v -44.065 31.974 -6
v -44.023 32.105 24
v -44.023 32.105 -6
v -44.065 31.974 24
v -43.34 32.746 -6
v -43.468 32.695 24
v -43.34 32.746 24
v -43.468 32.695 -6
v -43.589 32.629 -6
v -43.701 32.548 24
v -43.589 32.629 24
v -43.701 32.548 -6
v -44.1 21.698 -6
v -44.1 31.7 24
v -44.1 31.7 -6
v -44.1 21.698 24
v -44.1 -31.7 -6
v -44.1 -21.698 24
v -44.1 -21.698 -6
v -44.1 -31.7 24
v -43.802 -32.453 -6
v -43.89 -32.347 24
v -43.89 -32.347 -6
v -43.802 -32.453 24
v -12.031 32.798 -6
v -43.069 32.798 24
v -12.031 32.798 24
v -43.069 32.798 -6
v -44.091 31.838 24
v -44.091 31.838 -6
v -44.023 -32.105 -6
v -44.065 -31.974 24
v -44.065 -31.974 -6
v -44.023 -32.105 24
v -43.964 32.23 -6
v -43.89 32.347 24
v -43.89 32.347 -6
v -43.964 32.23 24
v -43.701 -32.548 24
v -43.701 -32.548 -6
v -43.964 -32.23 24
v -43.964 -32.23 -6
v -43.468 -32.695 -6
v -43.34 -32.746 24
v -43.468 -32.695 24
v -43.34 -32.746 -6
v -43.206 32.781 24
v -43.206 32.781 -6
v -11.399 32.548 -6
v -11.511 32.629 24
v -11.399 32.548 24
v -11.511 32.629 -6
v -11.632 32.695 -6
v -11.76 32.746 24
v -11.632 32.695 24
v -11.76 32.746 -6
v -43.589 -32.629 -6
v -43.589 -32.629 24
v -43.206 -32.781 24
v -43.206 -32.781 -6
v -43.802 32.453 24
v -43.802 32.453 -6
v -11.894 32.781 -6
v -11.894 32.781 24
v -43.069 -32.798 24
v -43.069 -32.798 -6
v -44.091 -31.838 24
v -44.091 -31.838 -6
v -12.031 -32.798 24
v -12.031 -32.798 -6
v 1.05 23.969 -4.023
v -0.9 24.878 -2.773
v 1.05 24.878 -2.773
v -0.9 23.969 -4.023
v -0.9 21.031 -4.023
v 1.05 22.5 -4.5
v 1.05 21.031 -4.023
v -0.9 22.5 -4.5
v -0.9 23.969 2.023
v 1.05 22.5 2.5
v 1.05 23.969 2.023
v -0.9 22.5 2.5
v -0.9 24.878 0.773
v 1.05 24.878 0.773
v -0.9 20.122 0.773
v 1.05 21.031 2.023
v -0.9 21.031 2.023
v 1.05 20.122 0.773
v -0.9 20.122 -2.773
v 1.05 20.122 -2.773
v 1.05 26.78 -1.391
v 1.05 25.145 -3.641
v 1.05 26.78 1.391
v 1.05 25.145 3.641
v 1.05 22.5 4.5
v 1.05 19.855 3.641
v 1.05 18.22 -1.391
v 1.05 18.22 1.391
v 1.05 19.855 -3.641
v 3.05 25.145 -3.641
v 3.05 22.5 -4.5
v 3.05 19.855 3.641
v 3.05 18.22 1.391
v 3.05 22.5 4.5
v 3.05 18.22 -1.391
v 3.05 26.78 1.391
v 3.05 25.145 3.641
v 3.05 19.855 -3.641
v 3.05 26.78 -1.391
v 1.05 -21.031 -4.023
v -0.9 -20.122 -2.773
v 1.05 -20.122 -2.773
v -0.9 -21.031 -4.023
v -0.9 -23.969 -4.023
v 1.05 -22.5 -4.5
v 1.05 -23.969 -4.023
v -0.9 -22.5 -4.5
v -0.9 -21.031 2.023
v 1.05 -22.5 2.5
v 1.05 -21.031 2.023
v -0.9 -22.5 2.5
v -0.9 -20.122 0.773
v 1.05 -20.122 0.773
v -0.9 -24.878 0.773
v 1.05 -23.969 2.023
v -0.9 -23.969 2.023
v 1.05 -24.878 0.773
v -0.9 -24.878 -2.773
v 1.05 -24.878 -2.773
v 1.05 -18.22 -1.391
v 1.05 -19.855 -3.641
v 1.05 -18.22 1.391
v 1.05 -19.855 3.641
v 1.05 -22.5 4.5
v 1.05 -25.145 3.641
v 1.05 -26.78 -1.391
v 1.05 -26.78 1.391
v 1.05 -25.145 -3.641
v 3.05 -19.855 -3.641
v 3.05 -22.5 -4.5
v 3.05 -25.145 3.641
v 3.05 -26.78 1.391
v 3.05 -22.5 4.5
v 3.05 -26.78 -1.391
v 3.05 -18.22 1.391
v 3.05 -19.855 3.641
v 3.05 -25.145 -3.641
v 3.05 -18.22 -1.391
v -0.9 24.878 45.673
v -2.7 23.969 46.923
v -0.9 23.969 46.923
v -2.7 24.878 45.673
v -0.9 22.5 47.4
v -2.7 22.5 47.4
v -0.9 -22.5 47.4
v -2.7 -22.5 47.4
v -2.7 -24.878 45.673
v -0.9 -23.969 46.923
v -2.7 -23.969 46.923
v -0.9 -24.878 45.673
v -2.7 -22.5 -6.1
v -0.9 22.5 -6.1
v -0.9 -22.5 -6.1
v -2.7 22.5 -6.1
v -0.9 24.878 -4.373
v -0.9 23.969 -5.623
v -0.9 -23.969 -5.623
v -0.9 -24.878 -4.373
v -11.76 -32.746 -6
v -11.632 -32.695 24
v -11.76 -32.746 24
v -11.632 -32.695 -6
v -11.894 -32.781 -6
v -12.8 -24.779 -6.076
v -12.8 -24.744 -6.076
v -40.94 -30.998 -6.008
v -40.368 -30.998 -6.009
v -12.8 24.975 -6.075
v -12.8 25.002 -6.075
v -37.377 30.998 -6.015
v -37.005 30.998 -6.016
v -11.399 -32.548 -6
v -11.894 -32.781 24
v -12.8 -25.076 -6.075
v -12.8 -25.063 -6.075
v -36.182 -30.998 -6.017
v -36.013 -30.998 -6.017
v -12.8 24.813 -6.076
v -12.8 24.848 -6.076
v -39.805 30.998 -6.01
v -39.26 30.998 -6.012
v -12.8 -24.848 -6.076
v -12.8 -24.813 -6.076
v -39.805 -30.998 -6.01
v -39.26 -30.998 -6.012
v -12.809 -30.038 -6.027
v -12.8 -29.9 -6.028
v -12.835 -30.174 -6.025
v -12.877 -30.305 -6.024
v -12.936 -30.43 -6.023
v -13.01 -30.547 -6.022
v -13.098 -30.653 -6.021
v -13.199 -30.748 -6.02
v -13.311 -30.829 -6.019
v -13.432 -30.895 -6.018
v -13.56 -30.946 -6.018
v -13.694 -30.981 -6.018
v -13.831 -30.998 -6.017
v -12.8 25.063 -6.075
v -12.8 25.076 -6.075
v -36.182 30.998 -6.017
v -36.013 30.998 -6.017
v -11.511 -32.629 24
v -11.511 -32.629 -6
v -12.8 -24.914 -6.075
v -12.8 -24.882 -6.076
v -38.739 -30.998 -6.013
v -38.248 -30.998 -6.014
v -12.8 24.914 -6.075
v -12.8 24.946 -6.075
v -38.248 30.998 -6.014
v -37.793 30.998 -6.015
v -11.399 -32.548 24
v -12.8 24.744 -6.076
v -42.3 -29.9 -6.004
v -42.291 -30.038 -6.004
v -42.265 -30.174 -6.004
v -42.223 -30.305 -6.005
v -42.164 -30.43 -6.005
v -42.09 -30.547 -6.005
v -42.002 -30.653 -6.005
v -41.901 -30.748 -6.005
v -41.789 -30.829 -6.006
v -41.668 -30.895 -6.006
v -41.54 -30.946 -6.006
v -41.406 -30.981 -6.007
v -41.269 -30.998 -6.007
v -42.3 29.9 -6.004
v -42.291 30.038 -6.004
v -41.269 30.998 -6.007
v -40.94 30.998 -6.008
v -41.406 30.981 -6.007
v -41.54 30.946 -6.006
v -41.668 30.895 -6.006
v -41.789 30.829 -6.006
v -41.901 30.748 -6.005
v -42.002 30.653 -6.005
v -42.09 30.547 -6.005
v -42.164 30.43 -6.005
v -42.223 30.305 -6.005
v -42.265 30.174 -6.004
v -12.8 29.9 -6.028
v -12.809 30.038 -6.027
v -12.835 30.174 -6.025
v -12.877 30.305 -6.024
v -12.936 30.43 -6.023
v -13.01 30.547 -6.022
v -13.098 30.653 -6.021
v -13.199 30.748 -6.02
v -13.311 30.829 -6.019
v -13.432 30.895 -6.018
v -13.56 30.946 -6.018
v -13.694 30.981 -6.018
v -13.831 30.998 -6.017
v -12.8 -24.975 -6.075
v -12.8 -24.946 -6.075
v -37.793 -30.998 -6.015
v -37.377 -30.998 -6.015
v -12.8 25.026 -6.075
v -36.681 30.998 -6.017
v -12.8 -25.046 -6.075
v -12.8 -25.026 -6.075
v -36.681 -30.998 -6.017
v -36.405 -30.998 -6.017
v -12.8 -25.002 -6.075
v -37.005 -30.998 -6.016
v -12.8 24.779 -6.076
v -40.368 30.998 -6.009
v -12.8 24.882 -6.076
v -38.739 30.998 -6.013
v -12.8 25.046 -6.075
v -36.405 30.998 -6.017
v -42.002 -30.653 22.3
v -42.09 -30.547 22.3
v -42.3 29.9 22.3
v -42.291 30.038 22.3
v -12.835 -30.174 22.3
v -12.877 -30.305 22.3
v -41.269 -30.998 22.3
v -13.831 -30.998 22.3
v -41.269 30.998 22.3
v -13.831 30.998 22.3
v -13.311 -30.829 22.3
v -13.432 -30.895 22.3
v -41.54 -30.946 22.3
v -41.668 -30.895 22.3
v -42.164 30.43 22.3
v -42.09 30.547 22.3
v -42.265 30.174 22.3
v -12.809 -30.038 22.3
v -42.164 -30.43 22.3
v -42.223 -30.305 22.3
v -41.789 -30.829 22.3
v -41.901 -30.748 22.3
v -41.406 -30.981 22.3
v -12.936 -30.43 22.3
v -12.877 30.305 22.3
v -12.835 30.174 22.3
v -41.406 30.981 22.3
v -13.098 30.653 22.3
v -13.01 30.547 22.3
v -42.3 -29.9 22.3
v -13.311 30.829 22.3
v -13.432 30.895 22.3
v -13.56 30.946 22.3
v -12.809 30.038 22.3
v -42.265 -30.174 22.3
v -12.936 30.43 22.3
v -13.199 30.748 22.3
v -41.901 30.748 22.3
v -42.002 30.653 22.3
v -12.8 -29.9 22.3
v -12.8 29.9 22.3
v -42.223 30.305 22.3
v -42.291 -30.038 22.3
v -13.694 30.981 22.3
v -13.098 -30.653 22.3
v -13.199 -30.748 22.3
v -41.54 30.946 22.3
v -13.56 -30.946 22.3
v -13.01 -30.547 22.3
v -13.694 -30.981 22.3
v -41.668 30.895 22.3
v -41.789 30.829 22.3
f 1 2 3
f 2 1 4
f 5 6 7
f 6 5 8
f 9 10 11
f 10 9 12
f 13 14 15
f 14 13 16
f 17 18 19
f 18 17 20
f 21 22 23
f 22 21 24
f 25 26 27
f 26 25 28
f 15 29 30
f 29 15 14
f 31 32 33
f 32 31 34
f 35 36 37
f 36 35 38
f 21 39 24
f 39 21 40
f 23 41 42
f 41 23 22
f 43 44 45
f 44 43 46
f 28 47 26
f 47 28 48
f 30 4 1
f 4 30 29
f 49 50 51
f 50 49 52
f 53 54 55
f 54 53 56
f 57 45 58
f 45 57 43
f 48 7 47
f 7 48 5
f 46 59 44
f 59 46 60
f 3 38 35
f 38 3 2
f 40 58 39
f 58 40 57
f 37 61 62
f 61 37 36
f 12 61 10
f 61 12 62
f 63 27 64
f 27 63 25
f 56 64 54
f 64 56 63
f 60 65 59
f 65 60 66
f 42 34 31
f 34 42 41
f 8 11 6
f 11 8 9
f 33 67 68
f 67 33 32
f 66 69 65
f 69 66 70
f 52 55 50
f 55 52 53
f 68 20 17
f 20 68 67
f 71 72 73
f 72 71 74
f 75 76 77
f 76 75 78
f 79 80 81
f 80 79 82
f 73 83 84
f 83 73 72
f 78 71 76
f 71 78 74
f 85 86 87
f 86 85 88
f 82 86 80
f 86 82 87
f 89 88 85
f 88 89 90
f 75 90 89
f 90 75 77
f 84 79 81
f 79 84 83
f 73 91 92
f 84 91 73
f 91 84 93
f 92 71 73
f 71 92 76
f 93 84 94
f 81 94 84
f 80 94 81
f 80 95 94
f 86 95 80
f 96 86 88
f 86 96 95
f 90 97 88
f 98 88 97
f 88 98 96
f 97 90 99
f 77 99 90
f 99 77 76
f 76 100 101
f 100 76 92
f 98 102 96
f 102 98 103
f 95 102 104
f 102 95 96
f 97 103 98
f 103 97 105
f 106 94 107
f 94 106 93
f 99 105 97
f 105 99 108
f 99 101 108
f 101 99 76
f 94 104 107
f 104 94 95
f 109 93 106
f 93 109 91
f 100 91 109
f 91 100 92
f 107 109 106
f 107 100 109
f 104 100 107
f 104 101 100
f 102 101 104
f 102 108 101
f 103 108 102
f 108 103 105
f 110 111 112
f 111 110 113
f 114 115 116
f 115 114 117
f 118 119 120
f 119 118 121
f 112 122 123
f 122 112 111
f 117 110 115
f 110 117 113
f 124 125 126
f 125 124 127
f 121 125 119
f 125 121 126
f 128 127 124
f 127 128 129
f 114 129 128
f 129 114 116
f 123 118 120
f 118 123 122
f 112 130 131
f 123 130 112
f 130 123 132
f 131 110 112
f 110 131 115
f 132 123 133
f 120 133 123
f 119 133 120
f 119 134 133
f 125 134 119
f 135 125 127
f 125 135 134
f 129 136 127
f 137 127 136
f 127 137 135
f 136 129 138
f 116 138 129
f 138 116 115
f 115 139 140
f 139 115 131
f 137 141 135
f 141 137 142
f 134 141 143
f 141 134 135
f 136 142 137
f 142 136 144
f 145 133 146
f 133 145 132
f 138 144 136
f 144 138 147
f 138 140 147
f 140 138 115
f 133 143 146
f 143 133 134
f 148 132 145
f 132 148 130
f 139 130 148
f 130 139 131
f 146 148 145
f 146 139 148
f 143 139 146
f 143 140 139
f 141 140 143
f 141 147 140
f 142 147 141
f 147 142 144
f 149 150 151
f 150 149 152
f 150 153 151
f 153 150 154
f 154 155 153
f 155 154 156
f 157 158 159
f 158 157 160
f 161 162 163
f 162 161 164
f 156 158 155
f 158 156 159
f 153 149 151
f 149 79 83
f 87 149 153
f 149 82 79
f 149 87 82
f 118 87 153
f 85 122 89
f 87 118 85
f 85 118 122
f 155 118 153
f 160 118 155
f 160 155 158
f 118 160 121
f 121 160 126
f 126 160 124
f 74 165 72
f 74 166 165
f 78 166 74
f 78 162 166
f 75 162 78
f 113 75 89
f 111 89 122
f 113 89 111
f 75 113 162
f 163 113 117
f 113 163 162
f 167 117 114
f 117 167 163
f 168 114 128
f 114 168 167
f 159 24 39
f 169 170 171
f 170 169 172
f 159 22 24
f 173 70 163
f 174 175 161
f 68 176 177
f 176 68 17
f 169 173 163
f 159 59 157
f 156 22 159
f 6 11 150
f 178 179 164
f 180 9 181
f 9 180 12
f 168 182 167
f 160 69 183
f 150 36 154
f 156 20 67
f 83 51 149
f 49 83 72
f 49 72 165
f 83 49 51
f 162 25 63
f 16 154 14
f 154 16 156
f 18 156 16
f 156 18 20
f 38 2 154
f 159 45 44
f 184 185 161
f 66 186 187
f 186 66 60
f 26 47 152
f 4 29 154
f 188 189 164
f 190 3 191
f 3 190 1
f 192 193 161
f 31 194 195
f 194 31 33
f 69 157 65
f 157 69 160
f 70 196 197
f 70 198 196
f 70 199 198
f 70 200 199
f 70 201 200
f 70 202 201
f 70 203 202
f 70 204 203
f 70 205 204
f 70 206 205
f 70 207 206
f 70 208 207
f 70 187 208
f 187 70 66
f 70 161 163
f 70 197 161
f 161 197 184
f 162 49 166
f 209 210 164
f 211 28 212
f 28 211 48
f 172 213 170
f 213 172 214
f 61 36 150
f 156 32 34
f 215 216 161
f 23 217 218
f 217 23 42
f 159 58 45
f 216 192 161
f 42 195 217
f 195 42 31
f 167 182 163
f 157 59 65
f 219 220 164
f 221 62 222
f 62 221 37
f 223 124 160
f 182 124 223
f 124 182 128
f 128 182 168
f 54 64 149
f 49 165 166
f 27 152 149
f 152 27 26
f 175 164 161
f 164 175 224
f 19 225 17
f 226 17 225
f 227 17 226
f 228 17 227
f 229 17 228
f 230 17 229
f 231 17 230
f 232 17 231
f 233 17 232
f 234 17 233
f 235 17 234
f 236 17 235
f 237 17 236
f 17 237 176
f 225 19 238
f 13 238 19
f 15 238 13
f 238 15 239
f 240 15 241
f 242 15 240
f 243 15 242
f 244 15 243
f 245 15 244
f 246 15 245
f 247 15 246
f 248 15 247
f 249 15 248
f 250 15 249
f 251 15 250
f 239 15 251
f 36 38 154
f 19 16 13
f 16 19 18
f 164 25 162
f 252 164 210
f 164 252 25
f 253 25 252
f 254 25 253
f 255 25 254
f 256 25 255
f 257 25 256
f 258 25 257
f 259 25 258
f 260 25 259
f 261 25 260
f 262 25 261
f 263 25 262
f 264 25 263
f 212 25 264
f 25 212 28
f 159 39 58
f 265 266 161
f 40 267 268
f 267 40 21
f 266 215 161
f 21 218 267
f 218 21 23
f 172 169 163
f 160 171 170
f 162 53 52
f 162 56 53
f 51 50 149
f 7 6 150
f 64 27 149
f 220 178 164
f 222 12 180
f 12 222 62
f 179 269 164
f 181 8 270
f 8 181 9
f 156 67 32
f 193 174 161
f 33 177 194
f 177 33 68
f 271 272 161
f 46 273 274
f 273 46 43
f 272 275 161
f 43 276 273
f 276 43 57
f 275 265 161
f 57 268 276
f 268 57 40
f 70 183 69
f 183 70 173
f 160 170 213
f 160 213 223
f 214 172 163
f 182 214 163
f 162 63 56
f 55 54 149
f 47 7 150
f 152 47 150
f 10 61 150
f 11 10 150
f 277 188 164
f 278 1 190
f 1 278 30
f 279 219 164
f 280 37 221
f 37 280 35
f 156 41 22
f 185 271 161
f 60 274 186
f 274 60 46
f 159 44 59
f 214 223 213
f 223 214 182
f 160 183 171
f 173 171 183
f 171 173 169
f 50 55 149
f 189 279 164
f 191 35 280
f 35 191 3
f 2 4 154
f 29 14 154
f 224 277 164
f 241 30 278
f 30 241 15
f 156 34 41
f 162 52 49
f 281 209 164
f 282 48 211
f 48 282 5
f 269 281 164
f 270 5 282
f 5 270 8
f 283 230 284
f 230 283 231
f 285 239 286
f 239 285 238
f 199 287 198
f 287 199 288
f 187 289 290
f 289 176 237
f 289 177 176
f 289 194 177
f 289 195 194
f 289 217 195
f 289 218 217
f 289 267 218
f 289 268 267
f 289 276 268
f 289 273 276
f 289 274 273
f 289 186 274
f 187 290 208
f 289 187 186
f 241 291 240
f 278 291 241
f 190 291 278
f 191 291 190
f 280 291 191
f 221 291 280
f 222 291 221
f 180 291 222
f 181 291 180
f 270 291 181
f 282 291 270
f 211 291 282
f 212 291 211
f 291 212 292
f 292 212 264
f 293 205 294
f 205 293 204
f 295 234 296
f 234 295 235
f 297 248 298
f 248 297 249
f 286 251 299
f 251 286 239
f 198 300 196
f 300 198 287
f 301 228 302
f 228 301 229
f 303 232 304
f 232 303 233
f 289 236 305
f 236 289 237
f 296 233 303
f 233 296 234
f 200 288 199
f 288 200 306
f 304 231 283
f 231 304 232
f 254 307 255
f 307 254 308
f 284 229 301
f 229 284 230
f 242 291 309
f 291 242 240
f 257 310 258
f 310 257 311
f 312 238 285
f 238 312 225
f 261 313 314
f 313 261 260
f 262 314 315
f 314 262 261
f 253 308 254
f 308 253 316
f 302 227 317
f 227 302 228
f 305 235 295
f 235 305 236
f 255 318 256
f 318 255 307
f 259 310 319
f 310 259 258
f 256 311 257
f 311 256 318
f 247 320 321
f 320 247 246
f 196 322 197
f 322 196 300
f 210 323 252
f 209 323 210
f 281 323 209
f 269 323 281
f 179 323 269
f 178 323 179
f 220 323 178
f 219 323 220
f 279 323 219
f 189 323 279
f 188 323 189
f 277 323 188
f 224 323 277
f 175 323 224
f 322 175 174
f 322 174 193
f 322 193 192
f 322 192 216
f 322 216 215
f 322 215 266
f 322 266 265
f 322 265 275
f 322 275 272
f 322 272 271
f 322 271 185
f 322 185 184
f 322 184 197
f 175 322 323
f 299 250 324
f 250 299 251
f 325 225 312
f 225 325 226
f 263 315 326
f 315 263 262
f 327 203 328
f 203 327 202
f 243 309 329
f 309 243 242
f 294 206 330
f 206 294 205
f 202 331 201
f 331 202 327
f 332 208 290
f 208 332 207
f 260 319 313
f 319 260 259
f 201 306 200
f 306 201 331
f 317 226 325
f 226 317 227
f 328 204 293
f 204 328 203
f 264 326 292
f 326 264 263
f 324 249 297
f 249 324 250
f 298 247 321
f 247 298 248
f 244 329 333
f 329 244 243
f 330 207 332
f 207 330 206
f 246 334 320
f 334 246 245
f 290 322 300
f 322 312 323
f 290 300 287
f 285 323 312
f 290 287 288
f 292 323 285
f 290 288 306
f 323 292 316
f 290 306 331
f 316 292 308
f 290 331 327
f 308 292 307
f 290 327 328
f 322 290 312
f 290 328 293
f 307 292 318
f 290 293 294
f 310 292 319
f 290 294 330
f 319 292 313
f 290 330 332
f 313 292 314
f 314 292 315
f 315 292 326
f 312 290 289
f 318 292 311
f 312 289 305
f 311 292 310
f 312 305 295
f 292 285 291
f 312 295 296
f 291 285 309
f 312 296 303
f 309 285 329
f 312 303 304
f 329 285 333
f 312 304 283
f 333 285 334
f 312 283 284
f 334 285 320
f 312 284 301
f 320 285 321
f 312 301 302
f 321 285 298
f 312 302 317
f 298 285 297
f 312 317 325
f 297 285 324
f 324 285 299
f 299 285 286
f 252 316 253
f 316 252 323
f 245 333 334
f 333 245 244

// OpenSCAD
// PEGSTR - Pegboard Wizard
// Design by Marius Gheorghescu, November 2014
// Update log:
// November 9th 2014
//		- first coomplete version. Angled holders are often odd/incorrect.
// November 15th 2014
//		- minor tweaks to increase rendering speed. added logo. 
// November 28th 2014
//		- bug fixes

// preview[view:north, tilt:bottom diagonal]

// width of the orifice
holder_x_size = 62;

// depth of the orifice
holder_y_size = 29.5;

// hight of the holder
holder_height = 30;

// how thick are the walls. Hint: 6*extrusion width produces the best results.
wall_thickness = 1.80;

// how many times to repeat the holder on X axis
holder_x_count = 1;

// how many times to repeat the holder on Y axis
holder_y_count = 1;

// orifice corner radius (roundness). Needs to be less than min(x,y)/2.
corner_radius = 1;

// Use values less than 1.0 to make the bottom of the holder narrow
taper_ratio = 1.0;

// Keyhole connector
keyhole_pin = true;


/* [Advanced] */

// offset from the peg board, typically 0 unless you have an object that needs clearance
holder_offset = 10.0;

// what ratio of the holders bottom is reinforced to the plate [0.0-1.0]
strength_factor = 0.5;

// for bins: what ratio of wall thickness to use for closing the bottom
closed_bottom = 1;

// what percentage cu cut in the front (example to slip in a cable or make the tool snap from the side)
holder_cutout_side = 0.7;

// set an angle for the holder to prevent object from sliding or to view it better from the top
holder_angle = 0;


/* [Hidden] */

// what is the $fn parameter
holder_sides = max(50, min(20, holder_x_size*2));

// dimensions the same outside US?
hole_spacing = 45;
hole_size = 5;
board_thickness = 2;


holder_total_x = wall_thickness + holder_x_count*(wall_thickness+holder_x_size);
holder_total_y = wall_thickness + holder_y_count*(wall_thickness+holder_y_size);
holder_total_z = round(holder_height/hole_spacing)*hole_spacing;
holder_roundness = min(corner_radius, holder_x_size/2, holder_y_size/2); 


// what is the $fn parameter for holders
fn = 10;

epsilon = 0.1;

clip_height = 2*hole_size + 2;
$fn = fn;

module round_rect_ex(x1, y1, x2, y2, z, r1, r2)
{
	$fn=holder_sides;
	brim = z/10;

	//rotate([0,0,(holder_sides==6)?30:((holder_sides==4)?45:0)])
	hull() {
        translate([-x1/2 + r1, y1/2 - r1, z/2-brim/2])
            cylinder(r=r1, h=brim,center=true);
        translate([x1/2 - r1, y1/2 - r1, z/2-brim/2])
            cylinder(r=r1, h=brim,center=true);
        translate([-x1/2 + r1, -y1/2 + r1, z/2-brim/2])
            cylinder(r=r1, h=brim,center=true);
        translate([x1/2 - r1, -y1/2 + r1, z/2-brim/2])
            cylinder(r=r1, h=brim,center=true);

        translate([-x2/2 + r2, y2/2 - r2, -z/2+brim/2])
            cylinder(r=r2, h=brim,center=true);
        translate([x2/2 - r2, y2/2 - r2, -z/2+brim/2])
            cylinder(r=r2, h=brim,center=true);
        translate([-x2/2 + r2, -y2/2 + r2, -z/2+brim/2])
            cylinder(r=r2, h=brim,center=true);
        translate([x2/2 - r2, -y2/2 + r2, -z/2+brim/2])
            cylinder(r=r2, h=brim,center=true);

    }
}

module pin(clip)
{
    if (!keyhole_pin){
        rotate([0,0,15])
        cylinder(r=hole_size/2, h=board_thickness*1.5+epsilon, center=true);
    }

	if (clip) {
	    if (keyhole_pin){
                        color([0,1,0,0.5]){

            hull(){
                cylinder(r=hole_size/2, h=board_thickness+epsilon, center=true);
                translate([-2,0,0])
                cylinder(r=hole_size/2, h=board_thickness+epsilon, center=true);
            }}
			translate([0, 0, (board_thickness+epsilon)/2]){
            cylinder(r=hole_size/2+2, 2, center=false);}
                        
        } else {
            
		rotate([0,0,90])
		intersection() {
			translate([0, 0, hole_size-epsilon])
				cube([hole_size+2*epsilon, clip_height, 2*hole_size], center=true);

			// [-hole_size/2 - 1.95,0, board_thickness/2]
			translate([0, hole_size/2 + 2, board_thickness/2]) 
				rotate([0, 90, 0])
				rotate_extrude(convexity = 5, $fn=200)
				translate([5, 0, 0])
				 circle(r = (hole_size*0.95)/2); 
			
			translate([0, hole_size/2 + 2 - 1.6, board_thickness/2]) 
				rotate([45,0,0])
				translate([0, -0, hole_size*0.6])
					cube([hole_size+2*epsilon, 3*hole_size, hole_size], center=true);
		}
    }
	}
}

module pinboard_clips() 
{
	rotate([0,90,0])
	for(i=[0:round(holder_total_x/hole_spacing)]) {
		for(j=[0:max(strength_factor, round(holder_height/hole_spacing))]) {

			translate([
				j*hole_spacing, 
				-hole_spacing*(round(holder_total_x/hole_spacing)/2) + i*hole_spacing, 
				0])
					pin(j==0);
		}
	}
}

module pinboard(clips)
{
	rotate([0,90,0])
	translate([-epsilon, 0, -wall_thickness - board_thickness/2 + epsilon])
	hull() {
		translate([-clip_height/2 + hole_size/2, 
			-hole_spacing*(round(holder_total_x/hole_spacing)/2),0])
			cylinder(r=hole_size/2, h=wall_thickness);

		translate([-clip_height/2 + hole_size/2, 
			hole_spacing*(round(holder_total_x/hole_spacing)/2),0])
			cylinder(r=hole_size/2,  h=wall_thickness);

		translate([max(strength_factor, round(holder_height/hole_spacing))*hole_spacing,
			-hole_spacing*(round(holder_total_x/hole_spacing)/2),0])
			cylinder(r=hole_size/2, h=wall_thickness);

		translate([max(strength_factor, round(holder_height/hole_spacing))*hole_spacing,
			hole_spacing*(round(holder_total_x/hole_spacing)/2),0])
			cylinder(r=hole_size/2,  h=wall_thickness);

	}
}

module holder(negative)
{
 	for(x=[1:holder_x_count]){
		for(y=[1:holder_y_count]) 
/*		render(convexity=2)*/ {
			translate([
				-holder_total_y /*- (holder_y_size+wall_thickness)/2*/ + y*(holder_y_size+wall_thickness) + wall_thickness,

				-holder_total_x/2 + (holder_x_size+wall_thickness)/2 + (x-1)*(holder_x_size+wall_thickness) + wall_thickness/2,
				 0])			
	{
		rotate([0, holder_angle, 0])
		translate([
			-wall_thickness*abs(sin(holder_angle))-0*abs((holder_y_size/2)*sin(holder_angle))-holder_offset-(holder_y_size + 2*wall_thickness)/2 - board_thickness/2,
			0,
			-(holder_height/2)*sin(holder_angle) - holder_height/2 + clip_height/2
		])
		difference() {
			if (!negative)
				round_rect_ex(
					(holder_y_size + 2*wall_thickness), 
					holder_x_size + 2*wall_thickness, 
					(holder_y_size + 2*wall_thickness)*taper_ratio, 
					(holder_x_size + 2*wall_thickness)*taper_ratio, 
					holder_height, 
					holder_roundness + epsilon, 
					holder_roundness*taper_ratio + epsilon);

				translate([0,0,closed_bottom*wall_thickness])

				if (negative>1) {
					round_rect_ex(
						holder_y_size*taper_ratio, 
						holder_x_size*taper_ratio, 
						holder_y_size*taper_ratio, 
						holder_x_size*taper_ratio, 
						3*max(holder_height, hole_spacing),
						holder_roundness*taper_ratio + epsilon, 
						holder_roundness*taper_ratio + epsilon);
				} else {
					round_rect_ex(
						holder_y_size, 
						holder_x_size, 
						holder_y_size*taper_ratio, 
						holder_x_size*taper_ratio, 
						holder_height+2*epsilon,
						holder_roundness + epsilon, 
						holder_roundness*taper_ratio + epsilon);
				}

			if (!negative)
				if (holder_cutout_side > 0) {

				if (negative>1) {
					hull() {
						scale([1.0, holder_cutout_side, 1.0])
		 					round_rect_ex(
							holder_y_size*taper_ratio, 
							holder_x_size*taper_ratio, 
							holder_y_size*taper_ratio, 
							holder_x_size*taper_ratio, 
							3*max(holder_height, hole_spacing),
							holder_roundness*taper_ratio + epsilon, 
							holder_roundness*taper_ratio + epsilon);
		
						translate([0-(holder_y_size + 2*wall_thickness), 0,0])
						scale([1.0, holder_cutout_side, 1.0])
		 					round_rect_ex(
							holder_y_size*taper_ratio, 
							holder_x_size*taper_ratio, 
							holder_y_size*taper_ratio, 
							holder_x_size*taper_ratio, 
							3*max(holder_height, hole_spacing),
							holder_roundness*taper_ratio + epsilon, 
							holder_roundness*taper_ratio + epsilon);
					}
				} else {
					hull() {
						scale([1.0, holder_cutout_side, 1.0])
		 					round_rect_ex(
							holder_y_size, 
							holder_x_size, 
							holder_y_size*taper_ratio, 
							holder_x_size*taper_ratio, 
							holder_height+2*epsilon,
							holder_roundness + epsilon, 
							holder_roundness*taper_ratio + epsilon);
		
						translate([0-(holder_y_size + 2*wall_thickness), 0,0])
						scale([1.0, holder_cutout_side, 1.0])
		 					round_rect_ex(
							holder_y_size, 
							holder_x_size, 
							holder_y_size*taper_ratio, 
							holder_x_size*taper_ratio, 
							holder_height+2*epsilon,
							holder_roundness + epsilon, 
							holder_roundness*taper_ratio + epsilon);
						}
					}

				}
			}
		} // positioning
	} // for y
	} // for X
}


module pegstr() 
{




	difference() {
		union() {

			pinboard();

			difference() {
				hull() {
                    color ([0,0,0])

  					pinboard();

                    if (closed_bottom > 0)
                        holder(0);
                    else
					intersection() {

						translate([-holder_offset - (strength_factor-0.5)*holder_total_y - wall_thickness/4,0,0])
						cube([
							holder_total_y + 2*wall_thickness, 
							holder_total_x + wall_thickness, 
							2*holder_height
						], center=true);
	
						holder(0);
	
					}	
				}

				if (closed_bottom*wall_thickness < epsilon) {
						holder(2);
				}

			}

			difference() {
				holder(0);
				holder(2);
			}

            pinboard_clips();
		}
        
		holder(1);



	}
}

rotate([180,0,0]) pegstr();
